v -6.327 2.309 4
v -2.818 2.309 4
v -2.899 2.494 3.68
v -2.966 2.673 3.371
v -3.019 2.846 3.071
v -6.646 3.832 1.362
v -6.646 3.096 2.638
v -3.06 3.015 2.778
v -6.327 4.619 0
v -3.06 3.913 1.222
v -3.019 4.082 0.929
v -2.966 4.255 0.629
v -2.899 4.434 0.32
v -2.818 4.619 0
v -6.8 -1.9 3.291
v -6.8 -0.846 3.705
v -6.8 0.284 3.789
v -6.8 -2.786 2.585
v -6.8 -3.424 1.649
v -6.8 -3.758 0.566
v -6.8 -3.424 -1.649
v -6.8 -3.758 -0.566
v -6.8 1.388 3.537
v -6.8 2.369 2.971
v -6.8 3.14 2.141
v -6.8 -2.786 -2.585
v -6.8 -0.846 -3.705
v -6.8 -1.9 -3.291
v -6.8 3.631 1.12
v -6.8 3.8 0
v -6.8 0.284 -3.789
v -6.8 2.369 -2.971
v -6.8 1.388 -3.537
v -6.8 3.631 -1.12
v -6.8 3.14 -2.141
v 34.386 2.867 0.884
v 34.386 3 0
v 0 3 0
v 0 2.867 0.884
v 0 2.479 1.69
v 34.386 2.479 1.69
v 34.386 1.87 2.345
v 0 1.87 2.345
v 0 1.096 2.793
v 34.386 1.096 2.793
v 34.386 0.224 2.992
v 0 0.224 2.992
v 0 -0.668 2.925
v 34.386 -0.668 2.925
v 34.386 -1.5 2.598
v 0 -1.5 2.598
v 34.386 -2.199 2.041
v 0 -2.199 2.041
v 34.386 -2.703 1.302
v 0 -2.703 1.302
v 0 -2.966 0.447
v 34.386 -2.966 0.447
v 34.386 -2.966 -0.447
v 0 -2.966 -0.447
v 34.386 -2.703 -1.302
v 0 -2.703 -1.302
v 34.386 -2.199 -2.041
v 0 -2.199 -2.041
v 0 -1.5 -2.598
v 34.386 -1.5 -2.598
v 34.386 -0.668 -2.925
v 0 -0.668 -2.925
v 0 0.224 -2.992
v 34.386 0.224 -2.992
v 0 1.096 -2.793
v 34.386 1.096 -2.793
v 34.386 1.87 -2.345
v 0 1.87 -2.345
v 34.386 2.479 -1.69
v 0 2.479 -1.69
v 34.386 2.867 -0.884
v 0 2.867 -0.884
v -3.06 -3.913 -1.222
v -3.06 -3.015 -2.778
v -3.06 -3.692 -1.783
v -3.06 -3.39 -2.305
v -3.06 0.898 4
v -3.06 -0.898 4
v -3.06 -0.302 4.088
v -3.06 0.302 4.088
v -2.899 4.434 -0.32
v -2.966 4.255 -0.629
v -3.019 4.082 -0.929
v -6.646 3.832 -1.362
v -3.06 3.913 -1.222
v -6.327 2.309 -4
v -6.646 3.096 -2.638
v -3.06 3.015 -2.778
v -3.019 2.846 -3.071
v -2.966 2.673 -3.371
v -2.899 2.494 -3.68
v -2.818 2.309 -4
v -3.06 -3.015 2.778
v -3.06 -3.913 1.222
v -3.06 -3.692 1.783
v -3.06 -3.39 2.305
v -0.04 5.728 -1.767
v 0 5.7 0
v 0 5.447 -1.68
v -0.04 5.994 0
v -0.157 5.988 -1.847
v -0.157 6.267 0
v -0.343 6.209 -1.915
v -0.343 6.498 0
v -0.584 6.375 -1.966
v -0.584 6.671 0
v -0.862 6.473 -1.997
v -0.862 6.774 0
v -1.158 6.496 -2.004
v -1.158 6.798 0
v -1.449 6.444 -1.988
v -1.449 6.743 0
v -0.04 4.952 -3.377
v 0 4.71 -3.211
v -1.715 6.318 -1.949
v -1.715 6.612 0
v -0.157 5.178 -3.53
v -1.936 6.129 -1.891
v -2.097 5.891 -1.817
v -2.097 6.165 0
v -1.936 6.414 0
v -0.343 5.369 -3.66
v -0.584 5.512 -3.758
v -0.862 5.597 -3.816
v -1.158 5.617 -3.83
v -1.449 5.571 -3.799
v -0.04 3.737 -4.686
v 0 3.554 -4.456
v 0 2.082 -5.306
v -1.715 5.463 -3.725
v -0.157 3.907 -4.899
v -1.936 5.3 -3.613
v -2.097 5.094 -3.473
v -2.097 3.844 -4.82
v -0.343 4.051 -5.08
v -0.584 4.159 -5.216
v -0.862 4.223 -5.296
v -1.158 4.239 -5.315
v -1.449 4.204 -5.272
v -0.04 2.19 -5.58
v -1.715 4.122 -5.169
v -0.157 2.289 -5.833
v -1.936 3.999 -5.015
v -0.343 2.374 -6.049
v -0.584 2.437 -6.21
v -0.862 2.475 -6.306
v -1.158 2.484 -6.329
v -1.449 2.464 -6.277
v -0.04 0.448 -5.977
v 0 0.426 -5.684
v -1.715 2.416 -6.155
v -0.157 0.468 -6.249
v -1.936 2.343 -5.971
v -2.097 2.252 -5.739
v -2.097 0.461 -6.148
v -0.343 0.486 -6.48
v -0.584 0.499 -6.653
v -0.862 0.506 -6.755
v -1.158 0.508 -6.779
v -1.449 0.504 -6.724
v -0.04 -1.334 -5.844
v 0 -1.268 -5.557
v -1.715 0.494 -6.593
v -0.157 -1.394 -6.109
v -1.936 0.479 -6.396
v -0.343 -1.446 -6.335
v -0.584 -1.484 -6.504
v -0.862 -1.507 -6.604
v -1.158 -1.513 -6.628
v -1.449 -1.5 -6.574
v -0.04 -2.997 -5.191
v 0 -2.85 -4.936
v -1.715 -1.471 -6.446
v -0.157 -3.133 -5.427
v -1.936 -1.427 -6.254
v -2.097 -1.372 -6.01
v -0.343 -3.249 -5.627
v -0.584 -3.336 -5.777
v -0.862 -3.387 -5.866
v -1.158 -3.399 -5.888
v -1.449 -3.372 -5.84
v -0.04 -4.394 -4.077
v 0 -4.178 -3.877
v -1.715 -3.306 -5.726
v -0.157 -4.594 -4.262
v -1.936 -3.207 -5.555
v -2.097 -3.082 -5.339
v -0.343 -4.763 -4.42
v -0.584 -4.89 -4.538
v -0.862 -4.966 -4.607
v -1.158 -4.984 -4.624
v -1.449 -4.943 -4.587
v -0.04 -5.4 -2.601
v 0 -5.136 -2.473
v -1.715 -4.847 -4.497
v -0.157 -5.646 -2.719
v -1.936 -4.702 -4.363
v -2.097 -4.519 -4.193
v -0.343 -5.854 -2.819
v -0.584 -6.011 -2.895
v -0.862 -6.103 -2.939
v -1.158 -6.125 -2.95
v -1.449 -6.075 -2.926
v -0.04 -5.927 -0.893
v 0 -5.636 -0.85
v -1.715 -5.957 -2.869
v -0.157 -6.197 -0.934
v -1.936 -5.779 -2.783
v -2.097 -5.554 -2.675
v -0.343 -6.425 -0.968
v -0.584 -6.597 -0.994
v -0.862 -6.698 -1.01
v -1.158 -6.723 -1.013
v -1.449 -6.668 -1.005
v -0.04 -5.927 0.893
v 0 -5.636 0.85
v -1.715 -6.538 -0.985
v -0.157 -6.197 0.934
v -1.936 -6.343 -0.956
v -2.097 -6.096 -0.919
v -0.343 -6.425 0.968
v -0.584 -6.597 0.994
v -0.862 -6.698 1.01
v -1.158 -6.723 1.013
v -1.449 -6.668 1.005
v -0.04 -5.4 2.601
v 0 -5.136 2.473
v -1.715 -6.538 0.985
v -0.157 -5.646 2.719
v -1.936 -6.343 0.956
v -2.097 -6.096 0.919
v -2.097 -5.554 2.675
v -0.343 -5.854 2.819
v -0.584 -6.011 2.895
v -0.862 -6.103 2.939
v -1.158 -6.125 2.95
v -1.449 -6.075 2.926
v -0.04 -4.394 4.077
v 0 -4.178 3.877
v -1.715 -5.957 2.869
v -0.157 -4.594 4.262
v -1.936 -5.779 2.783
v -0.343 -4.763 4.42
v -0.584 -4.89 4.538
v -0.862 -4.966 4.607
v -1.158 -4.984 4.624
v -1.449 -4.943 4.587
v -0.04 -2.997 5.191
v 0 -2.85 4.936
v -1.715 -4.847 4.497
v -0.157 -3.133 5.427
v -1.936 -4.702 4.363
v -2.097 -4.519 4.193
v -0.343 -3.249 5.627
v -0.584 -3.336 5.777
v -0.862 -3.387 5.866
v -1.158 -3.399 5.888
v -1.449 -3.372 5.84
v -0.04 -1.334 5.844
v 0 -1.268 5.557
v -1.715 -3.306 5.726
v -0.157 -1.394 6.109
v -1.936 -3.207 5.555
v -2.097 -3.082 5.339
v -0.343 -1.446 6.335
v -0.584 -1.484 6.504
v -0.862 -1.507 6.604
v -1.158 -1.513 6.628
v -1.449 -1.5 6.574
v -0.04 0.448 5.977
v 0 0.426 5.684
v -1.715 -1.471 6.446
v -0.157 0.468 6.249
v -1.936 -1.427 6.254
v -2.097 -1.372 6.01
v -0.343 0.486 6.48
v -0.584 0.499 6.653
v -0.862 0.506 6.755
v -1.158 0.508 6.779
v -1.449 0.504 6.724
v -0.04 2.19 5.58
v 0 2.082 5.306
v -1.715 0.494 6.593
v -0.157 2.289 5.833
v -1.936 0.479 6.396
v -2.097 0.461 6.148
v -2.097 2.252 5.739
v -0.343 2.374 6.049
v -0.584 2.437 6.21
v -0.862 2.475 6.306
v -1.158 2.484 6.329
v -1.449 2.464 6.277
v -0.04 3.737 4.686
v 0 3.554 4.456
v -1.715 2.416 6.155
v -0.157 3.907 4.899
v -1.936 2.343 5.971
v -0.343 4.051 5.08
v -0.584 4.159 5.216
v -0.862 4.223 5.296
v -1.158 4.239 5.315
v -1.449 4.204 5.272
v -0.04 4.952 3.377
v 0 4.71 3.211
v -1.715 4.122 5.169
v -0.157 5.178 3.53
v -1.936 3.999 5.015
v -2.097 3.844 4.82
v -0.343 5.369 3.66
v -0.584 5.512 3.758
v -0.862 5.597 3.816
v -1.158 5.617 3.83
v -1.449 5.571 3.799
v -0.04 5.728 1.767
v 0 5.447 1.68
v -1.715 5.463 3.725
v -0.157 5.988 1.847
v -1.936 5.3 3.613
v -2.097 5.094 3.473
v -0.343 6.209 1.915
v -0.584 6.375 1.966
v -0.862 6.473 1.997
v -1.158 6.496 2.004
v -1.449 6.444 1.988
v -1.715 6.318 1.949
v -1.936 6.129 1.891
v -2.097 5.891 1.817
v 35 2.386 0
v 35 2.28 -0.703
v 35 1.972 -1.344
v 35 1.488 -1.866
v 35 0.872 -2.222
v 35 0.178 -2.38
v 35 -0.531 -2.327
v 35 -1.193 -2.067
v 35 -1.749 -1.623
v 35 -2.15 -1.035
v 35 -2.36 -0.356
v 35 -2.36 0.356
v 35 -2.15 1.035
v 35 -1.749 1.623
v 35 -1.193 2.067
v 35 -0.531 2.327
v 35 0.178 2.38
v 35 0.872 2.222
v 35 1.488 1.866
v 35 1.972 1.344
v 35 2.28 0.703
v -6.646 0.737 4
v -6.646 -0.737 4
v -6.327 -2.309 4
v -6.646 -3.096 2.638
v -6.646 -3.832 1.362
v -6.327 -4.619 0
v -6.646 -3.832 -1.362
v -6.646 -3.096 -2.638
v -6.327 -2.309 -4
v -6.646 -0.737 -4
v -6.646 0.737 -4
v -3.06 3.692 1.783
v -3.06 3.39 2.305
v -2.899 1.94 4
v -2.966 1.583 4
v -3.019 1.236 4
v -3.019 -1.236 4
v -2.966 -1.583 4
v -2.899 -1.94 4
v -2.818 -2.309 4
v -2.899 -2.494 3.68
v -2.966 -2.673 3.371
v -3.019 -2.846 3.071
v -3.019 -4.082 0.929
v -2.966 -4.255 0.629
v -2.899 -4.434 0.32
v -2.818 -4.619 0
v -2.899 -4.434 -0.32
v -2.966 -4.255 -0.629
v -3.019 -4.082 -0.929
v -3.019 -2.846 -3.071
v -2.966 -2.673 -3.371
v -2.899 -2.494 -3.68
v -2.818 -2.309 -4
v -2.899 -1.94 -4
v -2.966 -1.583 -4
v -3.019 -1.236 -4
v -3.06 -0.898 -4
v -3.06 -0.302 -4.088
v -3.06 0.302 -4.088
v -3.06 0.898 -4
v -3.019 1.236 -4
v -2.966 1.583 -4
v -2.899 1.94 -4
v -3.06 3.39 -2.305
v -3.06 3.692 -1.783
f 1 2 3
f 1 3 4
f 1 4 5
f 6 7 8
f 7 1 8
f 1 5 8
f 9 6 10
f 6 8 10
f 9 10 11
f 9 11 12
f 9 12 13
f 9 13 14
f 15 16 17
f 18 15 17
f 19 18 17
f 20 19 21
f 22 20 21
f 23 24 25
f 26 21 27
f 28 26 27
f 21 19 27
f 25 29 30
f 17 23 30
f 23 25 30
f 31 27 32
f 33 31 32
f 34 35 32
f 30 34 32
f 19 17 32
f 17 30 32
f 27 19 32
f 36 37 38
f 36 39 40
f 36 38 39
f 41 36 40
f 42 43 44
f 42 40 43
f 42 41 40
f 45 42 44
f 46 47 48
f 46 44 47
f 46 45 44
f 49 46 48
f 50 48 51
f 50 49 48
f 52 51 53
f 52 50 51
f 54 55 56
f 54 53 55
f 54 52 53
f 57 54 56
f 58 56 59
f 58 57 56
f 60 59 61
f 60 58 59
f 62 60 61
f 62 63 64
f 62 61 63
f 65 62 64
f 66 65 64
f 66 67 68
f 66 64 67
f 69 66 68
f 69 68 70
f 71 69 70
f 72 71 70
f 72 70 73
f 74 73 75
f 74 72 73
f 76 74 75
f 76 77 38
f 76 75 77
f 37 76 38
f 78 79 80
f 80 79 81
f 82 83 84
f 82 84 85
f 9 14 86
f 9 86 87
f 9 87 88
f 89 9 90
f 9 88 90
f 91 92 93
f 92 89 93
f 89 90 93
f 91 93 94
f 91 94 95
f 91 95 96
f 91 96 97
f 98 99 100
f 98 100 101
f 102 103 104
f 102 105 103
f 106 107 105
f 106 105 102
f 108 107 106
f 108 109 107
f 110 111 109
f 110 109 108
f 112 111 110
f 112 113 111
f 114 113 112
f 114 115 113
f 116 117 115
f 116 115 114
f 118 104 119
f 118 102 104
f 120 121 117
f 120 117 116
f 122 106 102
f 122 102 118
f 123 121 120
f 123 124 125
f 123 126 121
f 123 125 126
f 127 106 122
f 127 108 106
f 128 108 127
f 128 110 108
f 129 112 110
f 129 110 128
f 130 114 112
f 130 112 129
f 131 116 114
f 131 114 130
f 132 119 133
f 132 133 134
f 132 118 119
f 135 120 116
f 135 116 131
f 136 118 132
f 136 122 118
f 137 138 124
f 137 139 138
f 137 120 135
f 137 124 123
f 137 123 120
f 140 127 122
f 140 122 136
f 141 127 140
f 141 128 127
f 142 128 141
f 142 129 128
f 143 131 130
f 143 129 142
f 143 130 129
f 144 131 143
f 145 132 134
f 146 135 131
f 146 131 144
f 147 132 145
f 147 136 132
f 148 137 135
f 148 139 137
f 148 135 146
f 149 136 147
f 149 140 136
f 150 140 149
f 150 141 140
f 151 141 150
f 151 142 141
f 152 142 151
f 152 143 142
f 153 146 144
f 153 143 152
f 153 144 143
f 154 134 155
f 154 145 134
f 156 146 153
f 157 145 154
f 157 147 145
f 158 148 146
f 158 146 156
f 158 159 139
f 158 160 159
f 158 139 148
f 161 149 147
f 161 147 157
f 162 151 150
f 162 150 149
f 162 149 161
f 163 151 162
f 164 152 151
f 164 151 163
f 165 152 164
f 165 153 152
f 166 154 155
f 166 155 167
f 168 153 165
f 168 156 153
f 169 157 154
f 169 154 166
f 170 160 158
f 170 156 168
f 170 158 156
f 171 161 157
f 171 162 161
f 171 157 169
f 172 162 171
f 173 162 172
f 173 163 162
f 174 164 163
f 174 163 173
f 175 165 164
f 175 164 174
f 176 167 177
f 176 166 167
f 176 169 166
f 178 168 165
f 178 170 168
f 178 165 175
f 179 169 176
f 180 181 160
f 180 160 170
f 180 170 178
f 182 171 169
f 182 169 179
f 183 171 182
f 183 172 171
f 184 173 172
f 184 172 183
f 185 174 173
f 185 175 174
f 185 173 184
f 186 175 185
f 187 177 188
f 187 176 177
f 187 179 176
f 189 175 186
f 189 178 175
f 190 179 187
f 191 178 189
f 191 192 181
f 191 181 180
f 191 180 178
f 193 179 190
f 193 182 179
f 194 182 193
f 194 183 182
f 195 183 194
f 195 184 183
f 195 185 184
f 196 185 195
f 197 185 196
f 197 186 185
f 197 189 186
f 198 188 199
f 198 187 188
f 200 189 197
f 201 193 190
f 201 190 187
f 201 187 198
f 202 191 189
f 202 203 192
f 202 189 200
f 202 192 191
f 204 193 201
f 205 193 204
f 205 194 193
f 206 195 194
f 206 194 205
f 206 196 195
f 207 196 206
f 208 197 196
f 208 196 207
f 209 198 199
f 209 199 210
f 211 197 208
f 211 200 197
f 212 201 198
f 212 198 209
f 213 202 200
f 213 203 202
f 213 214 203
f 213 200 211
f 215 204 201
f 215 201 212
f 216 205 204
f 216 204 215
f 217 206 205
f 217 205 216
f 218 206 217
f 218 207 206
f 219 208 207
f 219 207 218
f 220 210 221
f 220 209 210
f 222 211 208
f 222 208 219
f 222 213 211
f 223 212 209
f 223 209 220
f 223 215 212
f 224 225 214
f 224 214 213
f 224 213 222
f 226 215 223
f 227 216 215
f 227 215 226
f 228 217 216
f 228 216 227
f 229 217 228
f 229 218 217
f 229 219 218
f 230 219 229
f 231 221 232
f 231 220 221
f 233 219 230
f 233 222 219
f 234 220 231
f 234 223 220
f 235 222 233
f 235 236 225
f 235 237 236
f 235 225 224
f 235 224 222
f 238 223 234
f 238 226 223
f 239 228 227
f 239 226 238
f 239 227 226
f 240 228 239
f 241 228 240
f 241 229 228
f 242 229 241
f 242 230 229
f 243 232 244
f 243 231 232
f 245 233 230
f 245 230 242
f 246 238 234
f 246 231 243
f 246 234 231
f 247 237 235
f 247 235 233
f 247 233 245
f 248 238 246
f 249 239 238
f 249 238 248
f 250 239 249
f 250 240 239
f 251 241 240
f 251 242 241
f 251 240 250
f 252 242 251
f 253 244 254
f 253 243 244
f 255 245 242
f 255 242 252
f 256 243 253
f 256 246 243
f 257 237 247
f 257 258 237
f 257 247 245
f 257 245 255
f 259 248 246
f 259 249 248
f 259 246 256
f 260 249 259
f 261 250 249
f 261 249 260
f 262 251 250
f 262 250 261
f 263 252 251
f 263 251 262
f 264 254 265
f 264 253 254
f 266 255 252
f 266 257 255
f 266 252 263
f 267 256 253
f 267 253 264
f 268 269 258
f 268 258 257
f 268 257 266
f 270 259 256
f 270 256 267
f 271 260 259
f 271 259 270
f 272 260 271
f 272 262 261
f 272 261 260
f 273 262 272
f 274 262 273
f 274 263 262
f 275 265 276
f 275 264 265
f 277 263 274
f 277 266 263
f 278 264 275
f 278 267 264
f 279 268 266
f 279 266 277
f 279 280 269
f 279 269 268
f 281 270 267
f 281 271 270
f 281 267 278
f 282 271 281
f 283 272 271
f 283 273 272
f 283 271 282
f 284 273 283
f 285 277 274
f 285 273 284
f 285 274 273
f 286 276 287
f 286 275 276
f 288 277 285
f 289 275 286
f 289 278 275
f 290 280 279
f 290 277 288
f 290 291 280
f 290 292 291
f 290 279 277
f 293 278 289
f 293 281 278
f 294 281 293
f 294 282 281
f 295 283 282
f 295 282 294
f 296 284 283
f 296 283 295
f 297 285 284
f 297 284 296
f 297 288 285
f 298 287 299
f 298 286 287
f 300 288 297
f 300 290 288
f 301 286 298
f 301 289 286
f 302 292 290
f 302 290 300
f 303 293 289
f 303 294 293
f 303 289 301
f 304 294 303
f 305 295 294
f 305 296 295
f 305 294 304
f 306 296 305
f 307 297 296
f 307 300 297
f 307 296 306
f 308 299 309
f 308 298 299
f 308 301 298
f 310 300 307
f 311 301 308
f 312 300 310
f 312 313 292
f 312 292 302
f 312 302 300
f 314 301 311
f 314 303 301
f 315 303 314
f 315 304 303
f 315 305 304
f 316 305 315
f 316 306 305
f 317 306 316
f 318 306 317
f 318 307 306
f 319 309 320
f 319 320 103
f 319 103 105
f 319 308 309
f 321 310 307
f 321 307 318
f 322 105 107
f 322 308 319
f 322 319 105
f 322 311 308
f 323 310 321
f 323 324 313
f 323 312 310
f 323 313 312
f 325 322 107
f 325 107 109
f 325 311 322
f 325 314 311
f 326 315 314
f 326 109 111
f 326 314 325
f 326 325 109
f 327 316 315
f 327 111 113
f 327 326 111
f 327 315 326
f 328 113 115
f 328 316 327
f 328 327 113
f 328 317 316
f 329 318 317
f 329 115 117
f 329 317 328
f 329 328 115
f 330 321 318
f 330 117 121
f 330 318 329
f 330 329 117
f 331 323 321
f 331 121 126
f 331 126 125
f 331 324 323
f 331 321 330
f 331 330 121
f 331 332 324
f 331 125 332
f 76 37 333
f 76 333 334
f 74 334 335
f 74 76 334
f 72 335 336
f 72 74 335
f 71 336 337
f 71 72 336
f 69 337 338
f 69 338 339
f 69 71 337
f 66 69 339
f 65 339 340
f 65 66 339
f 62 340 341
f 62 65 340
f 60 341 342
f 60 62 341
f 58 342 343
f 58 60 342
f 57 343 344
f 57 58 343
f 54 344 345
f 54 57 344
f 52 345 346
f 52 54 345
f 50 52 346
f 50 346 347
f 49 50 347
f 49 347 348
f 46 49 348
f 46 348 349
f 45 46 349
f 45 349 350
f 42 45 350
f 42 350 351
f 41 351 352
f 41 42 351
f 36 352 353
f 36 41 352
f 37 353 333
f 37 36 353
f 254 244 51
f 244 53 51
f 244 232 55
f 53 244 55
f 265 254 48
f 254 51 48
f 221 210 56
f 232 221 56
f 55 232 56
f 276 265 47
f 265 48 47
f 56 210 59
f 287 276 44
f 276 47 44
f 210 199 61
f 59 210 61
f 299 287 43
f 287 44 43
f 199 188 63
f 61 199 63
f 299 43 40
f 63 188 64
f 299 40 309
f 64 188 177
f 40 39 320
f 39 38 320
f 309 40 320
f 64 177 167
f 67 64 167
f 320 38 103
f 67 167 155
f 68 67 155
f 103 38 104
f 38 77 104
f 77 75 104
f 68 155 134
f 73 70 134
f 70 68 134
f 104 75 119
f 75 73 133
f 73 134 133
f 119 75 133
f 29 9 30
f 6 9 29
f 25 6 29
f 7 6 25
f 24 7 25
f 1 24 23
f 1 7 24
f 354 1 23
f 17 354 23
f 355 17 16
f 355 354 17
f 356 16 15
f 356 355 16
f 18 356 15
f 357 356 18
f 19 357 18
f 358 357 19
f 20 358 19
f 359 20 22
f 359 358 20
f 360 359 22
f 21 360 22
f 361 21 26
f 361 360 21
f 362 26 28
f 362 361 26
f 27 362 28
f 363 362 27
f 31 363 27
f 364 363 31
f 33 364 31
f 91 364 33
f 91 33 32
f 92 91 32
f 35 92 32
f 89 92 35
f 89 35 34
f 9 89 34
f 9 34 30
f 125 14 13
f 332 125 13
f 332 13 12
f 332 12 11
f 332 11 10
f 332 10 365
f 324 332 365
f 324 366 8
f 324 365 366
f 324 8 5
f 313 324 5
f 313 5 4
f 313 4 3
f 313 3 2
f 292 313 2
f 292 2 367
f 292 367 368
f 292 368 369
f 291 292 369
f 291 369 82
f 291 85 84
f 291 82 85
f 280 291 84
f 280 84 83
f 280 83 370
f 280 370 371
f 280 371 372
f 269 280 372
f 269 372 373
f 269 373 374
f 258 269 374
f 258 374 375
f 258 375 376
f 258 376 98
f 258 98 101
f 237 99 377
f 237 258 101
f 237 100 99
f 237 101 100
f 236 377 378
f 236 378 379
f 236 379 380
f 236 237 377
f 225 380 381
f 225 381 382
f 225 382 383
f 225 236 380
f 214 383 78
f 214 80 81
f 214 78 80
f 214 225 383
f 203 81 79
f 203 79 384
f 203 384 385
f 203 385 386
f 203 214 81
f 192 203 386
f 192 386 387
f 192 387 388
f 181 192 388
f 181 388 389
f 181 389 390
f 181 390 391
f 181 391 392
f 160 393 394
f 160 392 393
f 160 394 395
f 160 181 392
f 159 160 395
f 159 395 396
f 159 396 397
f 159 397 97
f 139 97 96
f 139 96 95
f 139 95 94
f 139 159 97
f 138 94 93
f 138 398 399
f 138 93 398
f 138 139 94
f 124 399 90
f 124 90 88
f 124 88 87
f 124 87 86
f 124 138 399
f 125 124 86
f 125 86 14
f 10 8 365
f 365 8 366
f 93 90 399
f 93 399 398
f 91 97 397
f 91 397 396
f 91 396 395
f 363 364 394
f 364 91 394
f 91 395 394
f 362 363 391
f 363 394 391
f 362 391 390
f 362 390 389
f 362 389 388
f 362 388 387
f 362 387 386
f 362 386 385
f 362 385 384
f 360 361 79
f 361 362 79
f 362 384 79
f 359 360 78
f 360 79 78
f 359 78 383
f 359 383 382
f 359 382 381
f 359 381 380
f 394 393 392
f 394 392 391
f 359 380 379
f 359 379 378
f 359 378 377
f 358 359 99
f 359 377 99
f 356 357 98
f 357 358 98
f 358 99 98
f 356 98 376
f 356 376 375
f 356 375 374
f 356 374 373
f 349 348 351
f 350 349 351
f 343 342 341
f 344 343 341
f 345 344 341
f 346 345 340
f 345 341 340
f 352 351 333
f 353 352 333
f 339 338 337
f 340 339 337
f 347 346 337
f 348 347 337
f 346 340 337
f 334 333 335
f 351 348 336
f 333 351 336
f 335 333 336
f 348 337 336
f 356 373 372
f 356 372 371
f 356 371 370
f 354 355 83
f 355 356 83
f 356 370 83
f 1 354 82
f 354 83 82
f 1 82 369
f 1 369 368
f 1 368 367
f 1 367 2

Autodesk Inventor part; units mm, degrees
ref_plane "YZ Plane" through (0, 0, 0) normal (1, 0, 0) x (0, 1, 0)
ref_plane "XZ Plane" through (0, 0, 0) normal (0, 1, 0) x (-1, 0, 0)
sketch "Schizzo1" plane through (0, 0, 0) normal (0, 0, 1) x (1, 0, 0)
  line L0 (-3.06, 0) -> (-3.06, 4.0996)
  line L1 (0, 5.7) -> (0, 3)
  line L2 (17, 3) -> (35, 3)
  line L3 (35, 3) -> (35, 0)
  line L4 (35, 0) -> (-3.06, 0)
  arc A0 (0, 5.7) -> (-2.0969, 6.1649) centre (-1.1, 5.7) ccw
  line L5 (0, -1.4013) -> (0, 8.4076) projected
  line L6 (-10.672, 0) -> (42.612, 0) projected
  line L7 (0, 3) -> (0.0001, 3)
  line L8 (0.0001, 3) -> (0.0001, 3)
  line L9 (0.0001, 3) -> (16.3865, 3)
  line L10 (16.3865, 3) -> (17, 3)
  line L11 (-3.06, 4.0996) -> (-2.0969, 6.1649)
  line L12 (0.0001, 3) -> (17, 3) construction
  line L13 (17, 3) -> (17, 0) construction
  dimension "d0" = 1.1
  dimension "d1" = 35
  dimension "d2" = 18
  dimension "d3" = 13.6
  dimension "d4" = 6
  dimension "d5" = 3.06
  dimension "d15" = 6
  dimension "d16" = 6
  dimension "d17" = 0.0001
  dimension "d18" = 0.6135
  dimension "d19" = 25
revolve "Corpo" add sketch "Schizzo1" angle 360 about axis through (35, 0, 0) along (-1, 0, 0)
sketch "Schizzo2" plane through (0, 0, 0) normal (1, 0, 0) x (0, 0, -1)
  line L0 (4, 2.3094) -> (4, -2.3094)
  line L1 (4, -2.3094) -> (0, -4.6188)
  line L2 (0, -4.6188) -> (-4, -2.3094)
  line L3 (-4, -2.3094) -> (-4, 2.3094)
  line L4 (-4, 2.3094) -> (0, 4.6188)
  line L5 (0, 4.6188) -> (4, 2.3094)
  point P0 (0, 0)
  point P1 (0, 0)
  dimension "d23" = 8
extrude "Testa" add sketch "Schizzo2" against normal blind 6.8
sketch "Schizzo3" plane through (0, 0, 0) normal (0, 0, 1) x (1, 0, 0)
  line L0 (-6.8, 3.8) -> (-6.8, 4.6188)
  line L1 (-6.8, 4.6188) -> (-6.3273, 4.6188)
  line L2 (-6.3273, 4.6188) -> (-6.8, 3.8)
  line L3 (-7.5964, 0) -> (-2.0215, 0) projected
  line L4 (-6.8, 4.6188) -> (-6.8, 2.3094) projected
  line L5 (-2.8179, 4.6188) -> (-6.8, 4.6188) projected
  point P0 (-6.8, 2.3094)
  dimension "d8" = 30
  dimension "d22" = 7.6
revolve "Smusso1" cut sketch "Schizzo3" angle 360 about axis through (-10, 0, 0) along (1, 0, 0)
thread "Filettatura" size "M6x1" class "6g" standard "ISO Metric profile" length 18
chamfer "Smusso2" distance 0.6135 distance2 0.6135 1 edges at (35, -3, 0) measured on face at (35, -0.3546, -0.3912)
ref_plane "Work Plane1" through (10.95, 0, 0) normal (0, 0, -1) x (1, 0, 0)
equation "\"d0\" = PHH"
equation "\"d1\" = NLG"
equation "\"d2\" = GEL"
equation "\"d3\" = LADI"
equation "\"d4\" = GD"
equation "\"d5\" = 0.45 * KOH"
equation "\"d15\" = SD2"
equation "\"d16\" = BDM"
equation "\"d18\" = GAL"
equation "\"d19\" = KEWI"
equation "\"d23\" = SW"
equation "\"d6\" = KOH"
equation "\"d8\" = ANG1"
equation "\"d22\" = SW0"
equation "\"d10\" = GEL"
equation "\"d13\" = -0.5 * SPD + 0.5 * GD"
equation "\"d14\" = GUL"
equation "\"NLG\" = 35"
equation "\"GD\" = NND"
equation "\"BDM\" = NND"
equation "\"KOH\" = 6.8"
equation "\"GEL\" = 18"
equation "\"LADI\" = 13.6"
equation "\"SW\" = 8"
equation "\"PHH\" = RR"
equation "\"SW0\" = 7.6"
equation "\"SPD\" = NND - 1.2269 * PTC"
equation "\"SD2\" = NND"
equation "\"SD\" = 0"
equation "\"ANG1\" = 30deg"
equation "\"KEWI\" = 25deg"
equation "\"GAL\" = 0.61345 * PTC"
equation "\"GUL\" = 0.61345 * PTC"
equation "\"PTC\" = 1"
equation "\"THREADDIA\" = 6"
equation "\"E0\" = 1.155 * SW"
equation "\"TOA\" = 30deg"
equation "\"NND\" = 6"
equation "\"GD1\" = THREADDIA - 1.2269 * PTC"
equation "\"SDH\" = SW"
equation "\"KOH1\" = 2.9"
equation "\"RR\" = 1.1"
properties part number "ISO 4162 - M6 x 35" material "Acciaio inossidabile"
